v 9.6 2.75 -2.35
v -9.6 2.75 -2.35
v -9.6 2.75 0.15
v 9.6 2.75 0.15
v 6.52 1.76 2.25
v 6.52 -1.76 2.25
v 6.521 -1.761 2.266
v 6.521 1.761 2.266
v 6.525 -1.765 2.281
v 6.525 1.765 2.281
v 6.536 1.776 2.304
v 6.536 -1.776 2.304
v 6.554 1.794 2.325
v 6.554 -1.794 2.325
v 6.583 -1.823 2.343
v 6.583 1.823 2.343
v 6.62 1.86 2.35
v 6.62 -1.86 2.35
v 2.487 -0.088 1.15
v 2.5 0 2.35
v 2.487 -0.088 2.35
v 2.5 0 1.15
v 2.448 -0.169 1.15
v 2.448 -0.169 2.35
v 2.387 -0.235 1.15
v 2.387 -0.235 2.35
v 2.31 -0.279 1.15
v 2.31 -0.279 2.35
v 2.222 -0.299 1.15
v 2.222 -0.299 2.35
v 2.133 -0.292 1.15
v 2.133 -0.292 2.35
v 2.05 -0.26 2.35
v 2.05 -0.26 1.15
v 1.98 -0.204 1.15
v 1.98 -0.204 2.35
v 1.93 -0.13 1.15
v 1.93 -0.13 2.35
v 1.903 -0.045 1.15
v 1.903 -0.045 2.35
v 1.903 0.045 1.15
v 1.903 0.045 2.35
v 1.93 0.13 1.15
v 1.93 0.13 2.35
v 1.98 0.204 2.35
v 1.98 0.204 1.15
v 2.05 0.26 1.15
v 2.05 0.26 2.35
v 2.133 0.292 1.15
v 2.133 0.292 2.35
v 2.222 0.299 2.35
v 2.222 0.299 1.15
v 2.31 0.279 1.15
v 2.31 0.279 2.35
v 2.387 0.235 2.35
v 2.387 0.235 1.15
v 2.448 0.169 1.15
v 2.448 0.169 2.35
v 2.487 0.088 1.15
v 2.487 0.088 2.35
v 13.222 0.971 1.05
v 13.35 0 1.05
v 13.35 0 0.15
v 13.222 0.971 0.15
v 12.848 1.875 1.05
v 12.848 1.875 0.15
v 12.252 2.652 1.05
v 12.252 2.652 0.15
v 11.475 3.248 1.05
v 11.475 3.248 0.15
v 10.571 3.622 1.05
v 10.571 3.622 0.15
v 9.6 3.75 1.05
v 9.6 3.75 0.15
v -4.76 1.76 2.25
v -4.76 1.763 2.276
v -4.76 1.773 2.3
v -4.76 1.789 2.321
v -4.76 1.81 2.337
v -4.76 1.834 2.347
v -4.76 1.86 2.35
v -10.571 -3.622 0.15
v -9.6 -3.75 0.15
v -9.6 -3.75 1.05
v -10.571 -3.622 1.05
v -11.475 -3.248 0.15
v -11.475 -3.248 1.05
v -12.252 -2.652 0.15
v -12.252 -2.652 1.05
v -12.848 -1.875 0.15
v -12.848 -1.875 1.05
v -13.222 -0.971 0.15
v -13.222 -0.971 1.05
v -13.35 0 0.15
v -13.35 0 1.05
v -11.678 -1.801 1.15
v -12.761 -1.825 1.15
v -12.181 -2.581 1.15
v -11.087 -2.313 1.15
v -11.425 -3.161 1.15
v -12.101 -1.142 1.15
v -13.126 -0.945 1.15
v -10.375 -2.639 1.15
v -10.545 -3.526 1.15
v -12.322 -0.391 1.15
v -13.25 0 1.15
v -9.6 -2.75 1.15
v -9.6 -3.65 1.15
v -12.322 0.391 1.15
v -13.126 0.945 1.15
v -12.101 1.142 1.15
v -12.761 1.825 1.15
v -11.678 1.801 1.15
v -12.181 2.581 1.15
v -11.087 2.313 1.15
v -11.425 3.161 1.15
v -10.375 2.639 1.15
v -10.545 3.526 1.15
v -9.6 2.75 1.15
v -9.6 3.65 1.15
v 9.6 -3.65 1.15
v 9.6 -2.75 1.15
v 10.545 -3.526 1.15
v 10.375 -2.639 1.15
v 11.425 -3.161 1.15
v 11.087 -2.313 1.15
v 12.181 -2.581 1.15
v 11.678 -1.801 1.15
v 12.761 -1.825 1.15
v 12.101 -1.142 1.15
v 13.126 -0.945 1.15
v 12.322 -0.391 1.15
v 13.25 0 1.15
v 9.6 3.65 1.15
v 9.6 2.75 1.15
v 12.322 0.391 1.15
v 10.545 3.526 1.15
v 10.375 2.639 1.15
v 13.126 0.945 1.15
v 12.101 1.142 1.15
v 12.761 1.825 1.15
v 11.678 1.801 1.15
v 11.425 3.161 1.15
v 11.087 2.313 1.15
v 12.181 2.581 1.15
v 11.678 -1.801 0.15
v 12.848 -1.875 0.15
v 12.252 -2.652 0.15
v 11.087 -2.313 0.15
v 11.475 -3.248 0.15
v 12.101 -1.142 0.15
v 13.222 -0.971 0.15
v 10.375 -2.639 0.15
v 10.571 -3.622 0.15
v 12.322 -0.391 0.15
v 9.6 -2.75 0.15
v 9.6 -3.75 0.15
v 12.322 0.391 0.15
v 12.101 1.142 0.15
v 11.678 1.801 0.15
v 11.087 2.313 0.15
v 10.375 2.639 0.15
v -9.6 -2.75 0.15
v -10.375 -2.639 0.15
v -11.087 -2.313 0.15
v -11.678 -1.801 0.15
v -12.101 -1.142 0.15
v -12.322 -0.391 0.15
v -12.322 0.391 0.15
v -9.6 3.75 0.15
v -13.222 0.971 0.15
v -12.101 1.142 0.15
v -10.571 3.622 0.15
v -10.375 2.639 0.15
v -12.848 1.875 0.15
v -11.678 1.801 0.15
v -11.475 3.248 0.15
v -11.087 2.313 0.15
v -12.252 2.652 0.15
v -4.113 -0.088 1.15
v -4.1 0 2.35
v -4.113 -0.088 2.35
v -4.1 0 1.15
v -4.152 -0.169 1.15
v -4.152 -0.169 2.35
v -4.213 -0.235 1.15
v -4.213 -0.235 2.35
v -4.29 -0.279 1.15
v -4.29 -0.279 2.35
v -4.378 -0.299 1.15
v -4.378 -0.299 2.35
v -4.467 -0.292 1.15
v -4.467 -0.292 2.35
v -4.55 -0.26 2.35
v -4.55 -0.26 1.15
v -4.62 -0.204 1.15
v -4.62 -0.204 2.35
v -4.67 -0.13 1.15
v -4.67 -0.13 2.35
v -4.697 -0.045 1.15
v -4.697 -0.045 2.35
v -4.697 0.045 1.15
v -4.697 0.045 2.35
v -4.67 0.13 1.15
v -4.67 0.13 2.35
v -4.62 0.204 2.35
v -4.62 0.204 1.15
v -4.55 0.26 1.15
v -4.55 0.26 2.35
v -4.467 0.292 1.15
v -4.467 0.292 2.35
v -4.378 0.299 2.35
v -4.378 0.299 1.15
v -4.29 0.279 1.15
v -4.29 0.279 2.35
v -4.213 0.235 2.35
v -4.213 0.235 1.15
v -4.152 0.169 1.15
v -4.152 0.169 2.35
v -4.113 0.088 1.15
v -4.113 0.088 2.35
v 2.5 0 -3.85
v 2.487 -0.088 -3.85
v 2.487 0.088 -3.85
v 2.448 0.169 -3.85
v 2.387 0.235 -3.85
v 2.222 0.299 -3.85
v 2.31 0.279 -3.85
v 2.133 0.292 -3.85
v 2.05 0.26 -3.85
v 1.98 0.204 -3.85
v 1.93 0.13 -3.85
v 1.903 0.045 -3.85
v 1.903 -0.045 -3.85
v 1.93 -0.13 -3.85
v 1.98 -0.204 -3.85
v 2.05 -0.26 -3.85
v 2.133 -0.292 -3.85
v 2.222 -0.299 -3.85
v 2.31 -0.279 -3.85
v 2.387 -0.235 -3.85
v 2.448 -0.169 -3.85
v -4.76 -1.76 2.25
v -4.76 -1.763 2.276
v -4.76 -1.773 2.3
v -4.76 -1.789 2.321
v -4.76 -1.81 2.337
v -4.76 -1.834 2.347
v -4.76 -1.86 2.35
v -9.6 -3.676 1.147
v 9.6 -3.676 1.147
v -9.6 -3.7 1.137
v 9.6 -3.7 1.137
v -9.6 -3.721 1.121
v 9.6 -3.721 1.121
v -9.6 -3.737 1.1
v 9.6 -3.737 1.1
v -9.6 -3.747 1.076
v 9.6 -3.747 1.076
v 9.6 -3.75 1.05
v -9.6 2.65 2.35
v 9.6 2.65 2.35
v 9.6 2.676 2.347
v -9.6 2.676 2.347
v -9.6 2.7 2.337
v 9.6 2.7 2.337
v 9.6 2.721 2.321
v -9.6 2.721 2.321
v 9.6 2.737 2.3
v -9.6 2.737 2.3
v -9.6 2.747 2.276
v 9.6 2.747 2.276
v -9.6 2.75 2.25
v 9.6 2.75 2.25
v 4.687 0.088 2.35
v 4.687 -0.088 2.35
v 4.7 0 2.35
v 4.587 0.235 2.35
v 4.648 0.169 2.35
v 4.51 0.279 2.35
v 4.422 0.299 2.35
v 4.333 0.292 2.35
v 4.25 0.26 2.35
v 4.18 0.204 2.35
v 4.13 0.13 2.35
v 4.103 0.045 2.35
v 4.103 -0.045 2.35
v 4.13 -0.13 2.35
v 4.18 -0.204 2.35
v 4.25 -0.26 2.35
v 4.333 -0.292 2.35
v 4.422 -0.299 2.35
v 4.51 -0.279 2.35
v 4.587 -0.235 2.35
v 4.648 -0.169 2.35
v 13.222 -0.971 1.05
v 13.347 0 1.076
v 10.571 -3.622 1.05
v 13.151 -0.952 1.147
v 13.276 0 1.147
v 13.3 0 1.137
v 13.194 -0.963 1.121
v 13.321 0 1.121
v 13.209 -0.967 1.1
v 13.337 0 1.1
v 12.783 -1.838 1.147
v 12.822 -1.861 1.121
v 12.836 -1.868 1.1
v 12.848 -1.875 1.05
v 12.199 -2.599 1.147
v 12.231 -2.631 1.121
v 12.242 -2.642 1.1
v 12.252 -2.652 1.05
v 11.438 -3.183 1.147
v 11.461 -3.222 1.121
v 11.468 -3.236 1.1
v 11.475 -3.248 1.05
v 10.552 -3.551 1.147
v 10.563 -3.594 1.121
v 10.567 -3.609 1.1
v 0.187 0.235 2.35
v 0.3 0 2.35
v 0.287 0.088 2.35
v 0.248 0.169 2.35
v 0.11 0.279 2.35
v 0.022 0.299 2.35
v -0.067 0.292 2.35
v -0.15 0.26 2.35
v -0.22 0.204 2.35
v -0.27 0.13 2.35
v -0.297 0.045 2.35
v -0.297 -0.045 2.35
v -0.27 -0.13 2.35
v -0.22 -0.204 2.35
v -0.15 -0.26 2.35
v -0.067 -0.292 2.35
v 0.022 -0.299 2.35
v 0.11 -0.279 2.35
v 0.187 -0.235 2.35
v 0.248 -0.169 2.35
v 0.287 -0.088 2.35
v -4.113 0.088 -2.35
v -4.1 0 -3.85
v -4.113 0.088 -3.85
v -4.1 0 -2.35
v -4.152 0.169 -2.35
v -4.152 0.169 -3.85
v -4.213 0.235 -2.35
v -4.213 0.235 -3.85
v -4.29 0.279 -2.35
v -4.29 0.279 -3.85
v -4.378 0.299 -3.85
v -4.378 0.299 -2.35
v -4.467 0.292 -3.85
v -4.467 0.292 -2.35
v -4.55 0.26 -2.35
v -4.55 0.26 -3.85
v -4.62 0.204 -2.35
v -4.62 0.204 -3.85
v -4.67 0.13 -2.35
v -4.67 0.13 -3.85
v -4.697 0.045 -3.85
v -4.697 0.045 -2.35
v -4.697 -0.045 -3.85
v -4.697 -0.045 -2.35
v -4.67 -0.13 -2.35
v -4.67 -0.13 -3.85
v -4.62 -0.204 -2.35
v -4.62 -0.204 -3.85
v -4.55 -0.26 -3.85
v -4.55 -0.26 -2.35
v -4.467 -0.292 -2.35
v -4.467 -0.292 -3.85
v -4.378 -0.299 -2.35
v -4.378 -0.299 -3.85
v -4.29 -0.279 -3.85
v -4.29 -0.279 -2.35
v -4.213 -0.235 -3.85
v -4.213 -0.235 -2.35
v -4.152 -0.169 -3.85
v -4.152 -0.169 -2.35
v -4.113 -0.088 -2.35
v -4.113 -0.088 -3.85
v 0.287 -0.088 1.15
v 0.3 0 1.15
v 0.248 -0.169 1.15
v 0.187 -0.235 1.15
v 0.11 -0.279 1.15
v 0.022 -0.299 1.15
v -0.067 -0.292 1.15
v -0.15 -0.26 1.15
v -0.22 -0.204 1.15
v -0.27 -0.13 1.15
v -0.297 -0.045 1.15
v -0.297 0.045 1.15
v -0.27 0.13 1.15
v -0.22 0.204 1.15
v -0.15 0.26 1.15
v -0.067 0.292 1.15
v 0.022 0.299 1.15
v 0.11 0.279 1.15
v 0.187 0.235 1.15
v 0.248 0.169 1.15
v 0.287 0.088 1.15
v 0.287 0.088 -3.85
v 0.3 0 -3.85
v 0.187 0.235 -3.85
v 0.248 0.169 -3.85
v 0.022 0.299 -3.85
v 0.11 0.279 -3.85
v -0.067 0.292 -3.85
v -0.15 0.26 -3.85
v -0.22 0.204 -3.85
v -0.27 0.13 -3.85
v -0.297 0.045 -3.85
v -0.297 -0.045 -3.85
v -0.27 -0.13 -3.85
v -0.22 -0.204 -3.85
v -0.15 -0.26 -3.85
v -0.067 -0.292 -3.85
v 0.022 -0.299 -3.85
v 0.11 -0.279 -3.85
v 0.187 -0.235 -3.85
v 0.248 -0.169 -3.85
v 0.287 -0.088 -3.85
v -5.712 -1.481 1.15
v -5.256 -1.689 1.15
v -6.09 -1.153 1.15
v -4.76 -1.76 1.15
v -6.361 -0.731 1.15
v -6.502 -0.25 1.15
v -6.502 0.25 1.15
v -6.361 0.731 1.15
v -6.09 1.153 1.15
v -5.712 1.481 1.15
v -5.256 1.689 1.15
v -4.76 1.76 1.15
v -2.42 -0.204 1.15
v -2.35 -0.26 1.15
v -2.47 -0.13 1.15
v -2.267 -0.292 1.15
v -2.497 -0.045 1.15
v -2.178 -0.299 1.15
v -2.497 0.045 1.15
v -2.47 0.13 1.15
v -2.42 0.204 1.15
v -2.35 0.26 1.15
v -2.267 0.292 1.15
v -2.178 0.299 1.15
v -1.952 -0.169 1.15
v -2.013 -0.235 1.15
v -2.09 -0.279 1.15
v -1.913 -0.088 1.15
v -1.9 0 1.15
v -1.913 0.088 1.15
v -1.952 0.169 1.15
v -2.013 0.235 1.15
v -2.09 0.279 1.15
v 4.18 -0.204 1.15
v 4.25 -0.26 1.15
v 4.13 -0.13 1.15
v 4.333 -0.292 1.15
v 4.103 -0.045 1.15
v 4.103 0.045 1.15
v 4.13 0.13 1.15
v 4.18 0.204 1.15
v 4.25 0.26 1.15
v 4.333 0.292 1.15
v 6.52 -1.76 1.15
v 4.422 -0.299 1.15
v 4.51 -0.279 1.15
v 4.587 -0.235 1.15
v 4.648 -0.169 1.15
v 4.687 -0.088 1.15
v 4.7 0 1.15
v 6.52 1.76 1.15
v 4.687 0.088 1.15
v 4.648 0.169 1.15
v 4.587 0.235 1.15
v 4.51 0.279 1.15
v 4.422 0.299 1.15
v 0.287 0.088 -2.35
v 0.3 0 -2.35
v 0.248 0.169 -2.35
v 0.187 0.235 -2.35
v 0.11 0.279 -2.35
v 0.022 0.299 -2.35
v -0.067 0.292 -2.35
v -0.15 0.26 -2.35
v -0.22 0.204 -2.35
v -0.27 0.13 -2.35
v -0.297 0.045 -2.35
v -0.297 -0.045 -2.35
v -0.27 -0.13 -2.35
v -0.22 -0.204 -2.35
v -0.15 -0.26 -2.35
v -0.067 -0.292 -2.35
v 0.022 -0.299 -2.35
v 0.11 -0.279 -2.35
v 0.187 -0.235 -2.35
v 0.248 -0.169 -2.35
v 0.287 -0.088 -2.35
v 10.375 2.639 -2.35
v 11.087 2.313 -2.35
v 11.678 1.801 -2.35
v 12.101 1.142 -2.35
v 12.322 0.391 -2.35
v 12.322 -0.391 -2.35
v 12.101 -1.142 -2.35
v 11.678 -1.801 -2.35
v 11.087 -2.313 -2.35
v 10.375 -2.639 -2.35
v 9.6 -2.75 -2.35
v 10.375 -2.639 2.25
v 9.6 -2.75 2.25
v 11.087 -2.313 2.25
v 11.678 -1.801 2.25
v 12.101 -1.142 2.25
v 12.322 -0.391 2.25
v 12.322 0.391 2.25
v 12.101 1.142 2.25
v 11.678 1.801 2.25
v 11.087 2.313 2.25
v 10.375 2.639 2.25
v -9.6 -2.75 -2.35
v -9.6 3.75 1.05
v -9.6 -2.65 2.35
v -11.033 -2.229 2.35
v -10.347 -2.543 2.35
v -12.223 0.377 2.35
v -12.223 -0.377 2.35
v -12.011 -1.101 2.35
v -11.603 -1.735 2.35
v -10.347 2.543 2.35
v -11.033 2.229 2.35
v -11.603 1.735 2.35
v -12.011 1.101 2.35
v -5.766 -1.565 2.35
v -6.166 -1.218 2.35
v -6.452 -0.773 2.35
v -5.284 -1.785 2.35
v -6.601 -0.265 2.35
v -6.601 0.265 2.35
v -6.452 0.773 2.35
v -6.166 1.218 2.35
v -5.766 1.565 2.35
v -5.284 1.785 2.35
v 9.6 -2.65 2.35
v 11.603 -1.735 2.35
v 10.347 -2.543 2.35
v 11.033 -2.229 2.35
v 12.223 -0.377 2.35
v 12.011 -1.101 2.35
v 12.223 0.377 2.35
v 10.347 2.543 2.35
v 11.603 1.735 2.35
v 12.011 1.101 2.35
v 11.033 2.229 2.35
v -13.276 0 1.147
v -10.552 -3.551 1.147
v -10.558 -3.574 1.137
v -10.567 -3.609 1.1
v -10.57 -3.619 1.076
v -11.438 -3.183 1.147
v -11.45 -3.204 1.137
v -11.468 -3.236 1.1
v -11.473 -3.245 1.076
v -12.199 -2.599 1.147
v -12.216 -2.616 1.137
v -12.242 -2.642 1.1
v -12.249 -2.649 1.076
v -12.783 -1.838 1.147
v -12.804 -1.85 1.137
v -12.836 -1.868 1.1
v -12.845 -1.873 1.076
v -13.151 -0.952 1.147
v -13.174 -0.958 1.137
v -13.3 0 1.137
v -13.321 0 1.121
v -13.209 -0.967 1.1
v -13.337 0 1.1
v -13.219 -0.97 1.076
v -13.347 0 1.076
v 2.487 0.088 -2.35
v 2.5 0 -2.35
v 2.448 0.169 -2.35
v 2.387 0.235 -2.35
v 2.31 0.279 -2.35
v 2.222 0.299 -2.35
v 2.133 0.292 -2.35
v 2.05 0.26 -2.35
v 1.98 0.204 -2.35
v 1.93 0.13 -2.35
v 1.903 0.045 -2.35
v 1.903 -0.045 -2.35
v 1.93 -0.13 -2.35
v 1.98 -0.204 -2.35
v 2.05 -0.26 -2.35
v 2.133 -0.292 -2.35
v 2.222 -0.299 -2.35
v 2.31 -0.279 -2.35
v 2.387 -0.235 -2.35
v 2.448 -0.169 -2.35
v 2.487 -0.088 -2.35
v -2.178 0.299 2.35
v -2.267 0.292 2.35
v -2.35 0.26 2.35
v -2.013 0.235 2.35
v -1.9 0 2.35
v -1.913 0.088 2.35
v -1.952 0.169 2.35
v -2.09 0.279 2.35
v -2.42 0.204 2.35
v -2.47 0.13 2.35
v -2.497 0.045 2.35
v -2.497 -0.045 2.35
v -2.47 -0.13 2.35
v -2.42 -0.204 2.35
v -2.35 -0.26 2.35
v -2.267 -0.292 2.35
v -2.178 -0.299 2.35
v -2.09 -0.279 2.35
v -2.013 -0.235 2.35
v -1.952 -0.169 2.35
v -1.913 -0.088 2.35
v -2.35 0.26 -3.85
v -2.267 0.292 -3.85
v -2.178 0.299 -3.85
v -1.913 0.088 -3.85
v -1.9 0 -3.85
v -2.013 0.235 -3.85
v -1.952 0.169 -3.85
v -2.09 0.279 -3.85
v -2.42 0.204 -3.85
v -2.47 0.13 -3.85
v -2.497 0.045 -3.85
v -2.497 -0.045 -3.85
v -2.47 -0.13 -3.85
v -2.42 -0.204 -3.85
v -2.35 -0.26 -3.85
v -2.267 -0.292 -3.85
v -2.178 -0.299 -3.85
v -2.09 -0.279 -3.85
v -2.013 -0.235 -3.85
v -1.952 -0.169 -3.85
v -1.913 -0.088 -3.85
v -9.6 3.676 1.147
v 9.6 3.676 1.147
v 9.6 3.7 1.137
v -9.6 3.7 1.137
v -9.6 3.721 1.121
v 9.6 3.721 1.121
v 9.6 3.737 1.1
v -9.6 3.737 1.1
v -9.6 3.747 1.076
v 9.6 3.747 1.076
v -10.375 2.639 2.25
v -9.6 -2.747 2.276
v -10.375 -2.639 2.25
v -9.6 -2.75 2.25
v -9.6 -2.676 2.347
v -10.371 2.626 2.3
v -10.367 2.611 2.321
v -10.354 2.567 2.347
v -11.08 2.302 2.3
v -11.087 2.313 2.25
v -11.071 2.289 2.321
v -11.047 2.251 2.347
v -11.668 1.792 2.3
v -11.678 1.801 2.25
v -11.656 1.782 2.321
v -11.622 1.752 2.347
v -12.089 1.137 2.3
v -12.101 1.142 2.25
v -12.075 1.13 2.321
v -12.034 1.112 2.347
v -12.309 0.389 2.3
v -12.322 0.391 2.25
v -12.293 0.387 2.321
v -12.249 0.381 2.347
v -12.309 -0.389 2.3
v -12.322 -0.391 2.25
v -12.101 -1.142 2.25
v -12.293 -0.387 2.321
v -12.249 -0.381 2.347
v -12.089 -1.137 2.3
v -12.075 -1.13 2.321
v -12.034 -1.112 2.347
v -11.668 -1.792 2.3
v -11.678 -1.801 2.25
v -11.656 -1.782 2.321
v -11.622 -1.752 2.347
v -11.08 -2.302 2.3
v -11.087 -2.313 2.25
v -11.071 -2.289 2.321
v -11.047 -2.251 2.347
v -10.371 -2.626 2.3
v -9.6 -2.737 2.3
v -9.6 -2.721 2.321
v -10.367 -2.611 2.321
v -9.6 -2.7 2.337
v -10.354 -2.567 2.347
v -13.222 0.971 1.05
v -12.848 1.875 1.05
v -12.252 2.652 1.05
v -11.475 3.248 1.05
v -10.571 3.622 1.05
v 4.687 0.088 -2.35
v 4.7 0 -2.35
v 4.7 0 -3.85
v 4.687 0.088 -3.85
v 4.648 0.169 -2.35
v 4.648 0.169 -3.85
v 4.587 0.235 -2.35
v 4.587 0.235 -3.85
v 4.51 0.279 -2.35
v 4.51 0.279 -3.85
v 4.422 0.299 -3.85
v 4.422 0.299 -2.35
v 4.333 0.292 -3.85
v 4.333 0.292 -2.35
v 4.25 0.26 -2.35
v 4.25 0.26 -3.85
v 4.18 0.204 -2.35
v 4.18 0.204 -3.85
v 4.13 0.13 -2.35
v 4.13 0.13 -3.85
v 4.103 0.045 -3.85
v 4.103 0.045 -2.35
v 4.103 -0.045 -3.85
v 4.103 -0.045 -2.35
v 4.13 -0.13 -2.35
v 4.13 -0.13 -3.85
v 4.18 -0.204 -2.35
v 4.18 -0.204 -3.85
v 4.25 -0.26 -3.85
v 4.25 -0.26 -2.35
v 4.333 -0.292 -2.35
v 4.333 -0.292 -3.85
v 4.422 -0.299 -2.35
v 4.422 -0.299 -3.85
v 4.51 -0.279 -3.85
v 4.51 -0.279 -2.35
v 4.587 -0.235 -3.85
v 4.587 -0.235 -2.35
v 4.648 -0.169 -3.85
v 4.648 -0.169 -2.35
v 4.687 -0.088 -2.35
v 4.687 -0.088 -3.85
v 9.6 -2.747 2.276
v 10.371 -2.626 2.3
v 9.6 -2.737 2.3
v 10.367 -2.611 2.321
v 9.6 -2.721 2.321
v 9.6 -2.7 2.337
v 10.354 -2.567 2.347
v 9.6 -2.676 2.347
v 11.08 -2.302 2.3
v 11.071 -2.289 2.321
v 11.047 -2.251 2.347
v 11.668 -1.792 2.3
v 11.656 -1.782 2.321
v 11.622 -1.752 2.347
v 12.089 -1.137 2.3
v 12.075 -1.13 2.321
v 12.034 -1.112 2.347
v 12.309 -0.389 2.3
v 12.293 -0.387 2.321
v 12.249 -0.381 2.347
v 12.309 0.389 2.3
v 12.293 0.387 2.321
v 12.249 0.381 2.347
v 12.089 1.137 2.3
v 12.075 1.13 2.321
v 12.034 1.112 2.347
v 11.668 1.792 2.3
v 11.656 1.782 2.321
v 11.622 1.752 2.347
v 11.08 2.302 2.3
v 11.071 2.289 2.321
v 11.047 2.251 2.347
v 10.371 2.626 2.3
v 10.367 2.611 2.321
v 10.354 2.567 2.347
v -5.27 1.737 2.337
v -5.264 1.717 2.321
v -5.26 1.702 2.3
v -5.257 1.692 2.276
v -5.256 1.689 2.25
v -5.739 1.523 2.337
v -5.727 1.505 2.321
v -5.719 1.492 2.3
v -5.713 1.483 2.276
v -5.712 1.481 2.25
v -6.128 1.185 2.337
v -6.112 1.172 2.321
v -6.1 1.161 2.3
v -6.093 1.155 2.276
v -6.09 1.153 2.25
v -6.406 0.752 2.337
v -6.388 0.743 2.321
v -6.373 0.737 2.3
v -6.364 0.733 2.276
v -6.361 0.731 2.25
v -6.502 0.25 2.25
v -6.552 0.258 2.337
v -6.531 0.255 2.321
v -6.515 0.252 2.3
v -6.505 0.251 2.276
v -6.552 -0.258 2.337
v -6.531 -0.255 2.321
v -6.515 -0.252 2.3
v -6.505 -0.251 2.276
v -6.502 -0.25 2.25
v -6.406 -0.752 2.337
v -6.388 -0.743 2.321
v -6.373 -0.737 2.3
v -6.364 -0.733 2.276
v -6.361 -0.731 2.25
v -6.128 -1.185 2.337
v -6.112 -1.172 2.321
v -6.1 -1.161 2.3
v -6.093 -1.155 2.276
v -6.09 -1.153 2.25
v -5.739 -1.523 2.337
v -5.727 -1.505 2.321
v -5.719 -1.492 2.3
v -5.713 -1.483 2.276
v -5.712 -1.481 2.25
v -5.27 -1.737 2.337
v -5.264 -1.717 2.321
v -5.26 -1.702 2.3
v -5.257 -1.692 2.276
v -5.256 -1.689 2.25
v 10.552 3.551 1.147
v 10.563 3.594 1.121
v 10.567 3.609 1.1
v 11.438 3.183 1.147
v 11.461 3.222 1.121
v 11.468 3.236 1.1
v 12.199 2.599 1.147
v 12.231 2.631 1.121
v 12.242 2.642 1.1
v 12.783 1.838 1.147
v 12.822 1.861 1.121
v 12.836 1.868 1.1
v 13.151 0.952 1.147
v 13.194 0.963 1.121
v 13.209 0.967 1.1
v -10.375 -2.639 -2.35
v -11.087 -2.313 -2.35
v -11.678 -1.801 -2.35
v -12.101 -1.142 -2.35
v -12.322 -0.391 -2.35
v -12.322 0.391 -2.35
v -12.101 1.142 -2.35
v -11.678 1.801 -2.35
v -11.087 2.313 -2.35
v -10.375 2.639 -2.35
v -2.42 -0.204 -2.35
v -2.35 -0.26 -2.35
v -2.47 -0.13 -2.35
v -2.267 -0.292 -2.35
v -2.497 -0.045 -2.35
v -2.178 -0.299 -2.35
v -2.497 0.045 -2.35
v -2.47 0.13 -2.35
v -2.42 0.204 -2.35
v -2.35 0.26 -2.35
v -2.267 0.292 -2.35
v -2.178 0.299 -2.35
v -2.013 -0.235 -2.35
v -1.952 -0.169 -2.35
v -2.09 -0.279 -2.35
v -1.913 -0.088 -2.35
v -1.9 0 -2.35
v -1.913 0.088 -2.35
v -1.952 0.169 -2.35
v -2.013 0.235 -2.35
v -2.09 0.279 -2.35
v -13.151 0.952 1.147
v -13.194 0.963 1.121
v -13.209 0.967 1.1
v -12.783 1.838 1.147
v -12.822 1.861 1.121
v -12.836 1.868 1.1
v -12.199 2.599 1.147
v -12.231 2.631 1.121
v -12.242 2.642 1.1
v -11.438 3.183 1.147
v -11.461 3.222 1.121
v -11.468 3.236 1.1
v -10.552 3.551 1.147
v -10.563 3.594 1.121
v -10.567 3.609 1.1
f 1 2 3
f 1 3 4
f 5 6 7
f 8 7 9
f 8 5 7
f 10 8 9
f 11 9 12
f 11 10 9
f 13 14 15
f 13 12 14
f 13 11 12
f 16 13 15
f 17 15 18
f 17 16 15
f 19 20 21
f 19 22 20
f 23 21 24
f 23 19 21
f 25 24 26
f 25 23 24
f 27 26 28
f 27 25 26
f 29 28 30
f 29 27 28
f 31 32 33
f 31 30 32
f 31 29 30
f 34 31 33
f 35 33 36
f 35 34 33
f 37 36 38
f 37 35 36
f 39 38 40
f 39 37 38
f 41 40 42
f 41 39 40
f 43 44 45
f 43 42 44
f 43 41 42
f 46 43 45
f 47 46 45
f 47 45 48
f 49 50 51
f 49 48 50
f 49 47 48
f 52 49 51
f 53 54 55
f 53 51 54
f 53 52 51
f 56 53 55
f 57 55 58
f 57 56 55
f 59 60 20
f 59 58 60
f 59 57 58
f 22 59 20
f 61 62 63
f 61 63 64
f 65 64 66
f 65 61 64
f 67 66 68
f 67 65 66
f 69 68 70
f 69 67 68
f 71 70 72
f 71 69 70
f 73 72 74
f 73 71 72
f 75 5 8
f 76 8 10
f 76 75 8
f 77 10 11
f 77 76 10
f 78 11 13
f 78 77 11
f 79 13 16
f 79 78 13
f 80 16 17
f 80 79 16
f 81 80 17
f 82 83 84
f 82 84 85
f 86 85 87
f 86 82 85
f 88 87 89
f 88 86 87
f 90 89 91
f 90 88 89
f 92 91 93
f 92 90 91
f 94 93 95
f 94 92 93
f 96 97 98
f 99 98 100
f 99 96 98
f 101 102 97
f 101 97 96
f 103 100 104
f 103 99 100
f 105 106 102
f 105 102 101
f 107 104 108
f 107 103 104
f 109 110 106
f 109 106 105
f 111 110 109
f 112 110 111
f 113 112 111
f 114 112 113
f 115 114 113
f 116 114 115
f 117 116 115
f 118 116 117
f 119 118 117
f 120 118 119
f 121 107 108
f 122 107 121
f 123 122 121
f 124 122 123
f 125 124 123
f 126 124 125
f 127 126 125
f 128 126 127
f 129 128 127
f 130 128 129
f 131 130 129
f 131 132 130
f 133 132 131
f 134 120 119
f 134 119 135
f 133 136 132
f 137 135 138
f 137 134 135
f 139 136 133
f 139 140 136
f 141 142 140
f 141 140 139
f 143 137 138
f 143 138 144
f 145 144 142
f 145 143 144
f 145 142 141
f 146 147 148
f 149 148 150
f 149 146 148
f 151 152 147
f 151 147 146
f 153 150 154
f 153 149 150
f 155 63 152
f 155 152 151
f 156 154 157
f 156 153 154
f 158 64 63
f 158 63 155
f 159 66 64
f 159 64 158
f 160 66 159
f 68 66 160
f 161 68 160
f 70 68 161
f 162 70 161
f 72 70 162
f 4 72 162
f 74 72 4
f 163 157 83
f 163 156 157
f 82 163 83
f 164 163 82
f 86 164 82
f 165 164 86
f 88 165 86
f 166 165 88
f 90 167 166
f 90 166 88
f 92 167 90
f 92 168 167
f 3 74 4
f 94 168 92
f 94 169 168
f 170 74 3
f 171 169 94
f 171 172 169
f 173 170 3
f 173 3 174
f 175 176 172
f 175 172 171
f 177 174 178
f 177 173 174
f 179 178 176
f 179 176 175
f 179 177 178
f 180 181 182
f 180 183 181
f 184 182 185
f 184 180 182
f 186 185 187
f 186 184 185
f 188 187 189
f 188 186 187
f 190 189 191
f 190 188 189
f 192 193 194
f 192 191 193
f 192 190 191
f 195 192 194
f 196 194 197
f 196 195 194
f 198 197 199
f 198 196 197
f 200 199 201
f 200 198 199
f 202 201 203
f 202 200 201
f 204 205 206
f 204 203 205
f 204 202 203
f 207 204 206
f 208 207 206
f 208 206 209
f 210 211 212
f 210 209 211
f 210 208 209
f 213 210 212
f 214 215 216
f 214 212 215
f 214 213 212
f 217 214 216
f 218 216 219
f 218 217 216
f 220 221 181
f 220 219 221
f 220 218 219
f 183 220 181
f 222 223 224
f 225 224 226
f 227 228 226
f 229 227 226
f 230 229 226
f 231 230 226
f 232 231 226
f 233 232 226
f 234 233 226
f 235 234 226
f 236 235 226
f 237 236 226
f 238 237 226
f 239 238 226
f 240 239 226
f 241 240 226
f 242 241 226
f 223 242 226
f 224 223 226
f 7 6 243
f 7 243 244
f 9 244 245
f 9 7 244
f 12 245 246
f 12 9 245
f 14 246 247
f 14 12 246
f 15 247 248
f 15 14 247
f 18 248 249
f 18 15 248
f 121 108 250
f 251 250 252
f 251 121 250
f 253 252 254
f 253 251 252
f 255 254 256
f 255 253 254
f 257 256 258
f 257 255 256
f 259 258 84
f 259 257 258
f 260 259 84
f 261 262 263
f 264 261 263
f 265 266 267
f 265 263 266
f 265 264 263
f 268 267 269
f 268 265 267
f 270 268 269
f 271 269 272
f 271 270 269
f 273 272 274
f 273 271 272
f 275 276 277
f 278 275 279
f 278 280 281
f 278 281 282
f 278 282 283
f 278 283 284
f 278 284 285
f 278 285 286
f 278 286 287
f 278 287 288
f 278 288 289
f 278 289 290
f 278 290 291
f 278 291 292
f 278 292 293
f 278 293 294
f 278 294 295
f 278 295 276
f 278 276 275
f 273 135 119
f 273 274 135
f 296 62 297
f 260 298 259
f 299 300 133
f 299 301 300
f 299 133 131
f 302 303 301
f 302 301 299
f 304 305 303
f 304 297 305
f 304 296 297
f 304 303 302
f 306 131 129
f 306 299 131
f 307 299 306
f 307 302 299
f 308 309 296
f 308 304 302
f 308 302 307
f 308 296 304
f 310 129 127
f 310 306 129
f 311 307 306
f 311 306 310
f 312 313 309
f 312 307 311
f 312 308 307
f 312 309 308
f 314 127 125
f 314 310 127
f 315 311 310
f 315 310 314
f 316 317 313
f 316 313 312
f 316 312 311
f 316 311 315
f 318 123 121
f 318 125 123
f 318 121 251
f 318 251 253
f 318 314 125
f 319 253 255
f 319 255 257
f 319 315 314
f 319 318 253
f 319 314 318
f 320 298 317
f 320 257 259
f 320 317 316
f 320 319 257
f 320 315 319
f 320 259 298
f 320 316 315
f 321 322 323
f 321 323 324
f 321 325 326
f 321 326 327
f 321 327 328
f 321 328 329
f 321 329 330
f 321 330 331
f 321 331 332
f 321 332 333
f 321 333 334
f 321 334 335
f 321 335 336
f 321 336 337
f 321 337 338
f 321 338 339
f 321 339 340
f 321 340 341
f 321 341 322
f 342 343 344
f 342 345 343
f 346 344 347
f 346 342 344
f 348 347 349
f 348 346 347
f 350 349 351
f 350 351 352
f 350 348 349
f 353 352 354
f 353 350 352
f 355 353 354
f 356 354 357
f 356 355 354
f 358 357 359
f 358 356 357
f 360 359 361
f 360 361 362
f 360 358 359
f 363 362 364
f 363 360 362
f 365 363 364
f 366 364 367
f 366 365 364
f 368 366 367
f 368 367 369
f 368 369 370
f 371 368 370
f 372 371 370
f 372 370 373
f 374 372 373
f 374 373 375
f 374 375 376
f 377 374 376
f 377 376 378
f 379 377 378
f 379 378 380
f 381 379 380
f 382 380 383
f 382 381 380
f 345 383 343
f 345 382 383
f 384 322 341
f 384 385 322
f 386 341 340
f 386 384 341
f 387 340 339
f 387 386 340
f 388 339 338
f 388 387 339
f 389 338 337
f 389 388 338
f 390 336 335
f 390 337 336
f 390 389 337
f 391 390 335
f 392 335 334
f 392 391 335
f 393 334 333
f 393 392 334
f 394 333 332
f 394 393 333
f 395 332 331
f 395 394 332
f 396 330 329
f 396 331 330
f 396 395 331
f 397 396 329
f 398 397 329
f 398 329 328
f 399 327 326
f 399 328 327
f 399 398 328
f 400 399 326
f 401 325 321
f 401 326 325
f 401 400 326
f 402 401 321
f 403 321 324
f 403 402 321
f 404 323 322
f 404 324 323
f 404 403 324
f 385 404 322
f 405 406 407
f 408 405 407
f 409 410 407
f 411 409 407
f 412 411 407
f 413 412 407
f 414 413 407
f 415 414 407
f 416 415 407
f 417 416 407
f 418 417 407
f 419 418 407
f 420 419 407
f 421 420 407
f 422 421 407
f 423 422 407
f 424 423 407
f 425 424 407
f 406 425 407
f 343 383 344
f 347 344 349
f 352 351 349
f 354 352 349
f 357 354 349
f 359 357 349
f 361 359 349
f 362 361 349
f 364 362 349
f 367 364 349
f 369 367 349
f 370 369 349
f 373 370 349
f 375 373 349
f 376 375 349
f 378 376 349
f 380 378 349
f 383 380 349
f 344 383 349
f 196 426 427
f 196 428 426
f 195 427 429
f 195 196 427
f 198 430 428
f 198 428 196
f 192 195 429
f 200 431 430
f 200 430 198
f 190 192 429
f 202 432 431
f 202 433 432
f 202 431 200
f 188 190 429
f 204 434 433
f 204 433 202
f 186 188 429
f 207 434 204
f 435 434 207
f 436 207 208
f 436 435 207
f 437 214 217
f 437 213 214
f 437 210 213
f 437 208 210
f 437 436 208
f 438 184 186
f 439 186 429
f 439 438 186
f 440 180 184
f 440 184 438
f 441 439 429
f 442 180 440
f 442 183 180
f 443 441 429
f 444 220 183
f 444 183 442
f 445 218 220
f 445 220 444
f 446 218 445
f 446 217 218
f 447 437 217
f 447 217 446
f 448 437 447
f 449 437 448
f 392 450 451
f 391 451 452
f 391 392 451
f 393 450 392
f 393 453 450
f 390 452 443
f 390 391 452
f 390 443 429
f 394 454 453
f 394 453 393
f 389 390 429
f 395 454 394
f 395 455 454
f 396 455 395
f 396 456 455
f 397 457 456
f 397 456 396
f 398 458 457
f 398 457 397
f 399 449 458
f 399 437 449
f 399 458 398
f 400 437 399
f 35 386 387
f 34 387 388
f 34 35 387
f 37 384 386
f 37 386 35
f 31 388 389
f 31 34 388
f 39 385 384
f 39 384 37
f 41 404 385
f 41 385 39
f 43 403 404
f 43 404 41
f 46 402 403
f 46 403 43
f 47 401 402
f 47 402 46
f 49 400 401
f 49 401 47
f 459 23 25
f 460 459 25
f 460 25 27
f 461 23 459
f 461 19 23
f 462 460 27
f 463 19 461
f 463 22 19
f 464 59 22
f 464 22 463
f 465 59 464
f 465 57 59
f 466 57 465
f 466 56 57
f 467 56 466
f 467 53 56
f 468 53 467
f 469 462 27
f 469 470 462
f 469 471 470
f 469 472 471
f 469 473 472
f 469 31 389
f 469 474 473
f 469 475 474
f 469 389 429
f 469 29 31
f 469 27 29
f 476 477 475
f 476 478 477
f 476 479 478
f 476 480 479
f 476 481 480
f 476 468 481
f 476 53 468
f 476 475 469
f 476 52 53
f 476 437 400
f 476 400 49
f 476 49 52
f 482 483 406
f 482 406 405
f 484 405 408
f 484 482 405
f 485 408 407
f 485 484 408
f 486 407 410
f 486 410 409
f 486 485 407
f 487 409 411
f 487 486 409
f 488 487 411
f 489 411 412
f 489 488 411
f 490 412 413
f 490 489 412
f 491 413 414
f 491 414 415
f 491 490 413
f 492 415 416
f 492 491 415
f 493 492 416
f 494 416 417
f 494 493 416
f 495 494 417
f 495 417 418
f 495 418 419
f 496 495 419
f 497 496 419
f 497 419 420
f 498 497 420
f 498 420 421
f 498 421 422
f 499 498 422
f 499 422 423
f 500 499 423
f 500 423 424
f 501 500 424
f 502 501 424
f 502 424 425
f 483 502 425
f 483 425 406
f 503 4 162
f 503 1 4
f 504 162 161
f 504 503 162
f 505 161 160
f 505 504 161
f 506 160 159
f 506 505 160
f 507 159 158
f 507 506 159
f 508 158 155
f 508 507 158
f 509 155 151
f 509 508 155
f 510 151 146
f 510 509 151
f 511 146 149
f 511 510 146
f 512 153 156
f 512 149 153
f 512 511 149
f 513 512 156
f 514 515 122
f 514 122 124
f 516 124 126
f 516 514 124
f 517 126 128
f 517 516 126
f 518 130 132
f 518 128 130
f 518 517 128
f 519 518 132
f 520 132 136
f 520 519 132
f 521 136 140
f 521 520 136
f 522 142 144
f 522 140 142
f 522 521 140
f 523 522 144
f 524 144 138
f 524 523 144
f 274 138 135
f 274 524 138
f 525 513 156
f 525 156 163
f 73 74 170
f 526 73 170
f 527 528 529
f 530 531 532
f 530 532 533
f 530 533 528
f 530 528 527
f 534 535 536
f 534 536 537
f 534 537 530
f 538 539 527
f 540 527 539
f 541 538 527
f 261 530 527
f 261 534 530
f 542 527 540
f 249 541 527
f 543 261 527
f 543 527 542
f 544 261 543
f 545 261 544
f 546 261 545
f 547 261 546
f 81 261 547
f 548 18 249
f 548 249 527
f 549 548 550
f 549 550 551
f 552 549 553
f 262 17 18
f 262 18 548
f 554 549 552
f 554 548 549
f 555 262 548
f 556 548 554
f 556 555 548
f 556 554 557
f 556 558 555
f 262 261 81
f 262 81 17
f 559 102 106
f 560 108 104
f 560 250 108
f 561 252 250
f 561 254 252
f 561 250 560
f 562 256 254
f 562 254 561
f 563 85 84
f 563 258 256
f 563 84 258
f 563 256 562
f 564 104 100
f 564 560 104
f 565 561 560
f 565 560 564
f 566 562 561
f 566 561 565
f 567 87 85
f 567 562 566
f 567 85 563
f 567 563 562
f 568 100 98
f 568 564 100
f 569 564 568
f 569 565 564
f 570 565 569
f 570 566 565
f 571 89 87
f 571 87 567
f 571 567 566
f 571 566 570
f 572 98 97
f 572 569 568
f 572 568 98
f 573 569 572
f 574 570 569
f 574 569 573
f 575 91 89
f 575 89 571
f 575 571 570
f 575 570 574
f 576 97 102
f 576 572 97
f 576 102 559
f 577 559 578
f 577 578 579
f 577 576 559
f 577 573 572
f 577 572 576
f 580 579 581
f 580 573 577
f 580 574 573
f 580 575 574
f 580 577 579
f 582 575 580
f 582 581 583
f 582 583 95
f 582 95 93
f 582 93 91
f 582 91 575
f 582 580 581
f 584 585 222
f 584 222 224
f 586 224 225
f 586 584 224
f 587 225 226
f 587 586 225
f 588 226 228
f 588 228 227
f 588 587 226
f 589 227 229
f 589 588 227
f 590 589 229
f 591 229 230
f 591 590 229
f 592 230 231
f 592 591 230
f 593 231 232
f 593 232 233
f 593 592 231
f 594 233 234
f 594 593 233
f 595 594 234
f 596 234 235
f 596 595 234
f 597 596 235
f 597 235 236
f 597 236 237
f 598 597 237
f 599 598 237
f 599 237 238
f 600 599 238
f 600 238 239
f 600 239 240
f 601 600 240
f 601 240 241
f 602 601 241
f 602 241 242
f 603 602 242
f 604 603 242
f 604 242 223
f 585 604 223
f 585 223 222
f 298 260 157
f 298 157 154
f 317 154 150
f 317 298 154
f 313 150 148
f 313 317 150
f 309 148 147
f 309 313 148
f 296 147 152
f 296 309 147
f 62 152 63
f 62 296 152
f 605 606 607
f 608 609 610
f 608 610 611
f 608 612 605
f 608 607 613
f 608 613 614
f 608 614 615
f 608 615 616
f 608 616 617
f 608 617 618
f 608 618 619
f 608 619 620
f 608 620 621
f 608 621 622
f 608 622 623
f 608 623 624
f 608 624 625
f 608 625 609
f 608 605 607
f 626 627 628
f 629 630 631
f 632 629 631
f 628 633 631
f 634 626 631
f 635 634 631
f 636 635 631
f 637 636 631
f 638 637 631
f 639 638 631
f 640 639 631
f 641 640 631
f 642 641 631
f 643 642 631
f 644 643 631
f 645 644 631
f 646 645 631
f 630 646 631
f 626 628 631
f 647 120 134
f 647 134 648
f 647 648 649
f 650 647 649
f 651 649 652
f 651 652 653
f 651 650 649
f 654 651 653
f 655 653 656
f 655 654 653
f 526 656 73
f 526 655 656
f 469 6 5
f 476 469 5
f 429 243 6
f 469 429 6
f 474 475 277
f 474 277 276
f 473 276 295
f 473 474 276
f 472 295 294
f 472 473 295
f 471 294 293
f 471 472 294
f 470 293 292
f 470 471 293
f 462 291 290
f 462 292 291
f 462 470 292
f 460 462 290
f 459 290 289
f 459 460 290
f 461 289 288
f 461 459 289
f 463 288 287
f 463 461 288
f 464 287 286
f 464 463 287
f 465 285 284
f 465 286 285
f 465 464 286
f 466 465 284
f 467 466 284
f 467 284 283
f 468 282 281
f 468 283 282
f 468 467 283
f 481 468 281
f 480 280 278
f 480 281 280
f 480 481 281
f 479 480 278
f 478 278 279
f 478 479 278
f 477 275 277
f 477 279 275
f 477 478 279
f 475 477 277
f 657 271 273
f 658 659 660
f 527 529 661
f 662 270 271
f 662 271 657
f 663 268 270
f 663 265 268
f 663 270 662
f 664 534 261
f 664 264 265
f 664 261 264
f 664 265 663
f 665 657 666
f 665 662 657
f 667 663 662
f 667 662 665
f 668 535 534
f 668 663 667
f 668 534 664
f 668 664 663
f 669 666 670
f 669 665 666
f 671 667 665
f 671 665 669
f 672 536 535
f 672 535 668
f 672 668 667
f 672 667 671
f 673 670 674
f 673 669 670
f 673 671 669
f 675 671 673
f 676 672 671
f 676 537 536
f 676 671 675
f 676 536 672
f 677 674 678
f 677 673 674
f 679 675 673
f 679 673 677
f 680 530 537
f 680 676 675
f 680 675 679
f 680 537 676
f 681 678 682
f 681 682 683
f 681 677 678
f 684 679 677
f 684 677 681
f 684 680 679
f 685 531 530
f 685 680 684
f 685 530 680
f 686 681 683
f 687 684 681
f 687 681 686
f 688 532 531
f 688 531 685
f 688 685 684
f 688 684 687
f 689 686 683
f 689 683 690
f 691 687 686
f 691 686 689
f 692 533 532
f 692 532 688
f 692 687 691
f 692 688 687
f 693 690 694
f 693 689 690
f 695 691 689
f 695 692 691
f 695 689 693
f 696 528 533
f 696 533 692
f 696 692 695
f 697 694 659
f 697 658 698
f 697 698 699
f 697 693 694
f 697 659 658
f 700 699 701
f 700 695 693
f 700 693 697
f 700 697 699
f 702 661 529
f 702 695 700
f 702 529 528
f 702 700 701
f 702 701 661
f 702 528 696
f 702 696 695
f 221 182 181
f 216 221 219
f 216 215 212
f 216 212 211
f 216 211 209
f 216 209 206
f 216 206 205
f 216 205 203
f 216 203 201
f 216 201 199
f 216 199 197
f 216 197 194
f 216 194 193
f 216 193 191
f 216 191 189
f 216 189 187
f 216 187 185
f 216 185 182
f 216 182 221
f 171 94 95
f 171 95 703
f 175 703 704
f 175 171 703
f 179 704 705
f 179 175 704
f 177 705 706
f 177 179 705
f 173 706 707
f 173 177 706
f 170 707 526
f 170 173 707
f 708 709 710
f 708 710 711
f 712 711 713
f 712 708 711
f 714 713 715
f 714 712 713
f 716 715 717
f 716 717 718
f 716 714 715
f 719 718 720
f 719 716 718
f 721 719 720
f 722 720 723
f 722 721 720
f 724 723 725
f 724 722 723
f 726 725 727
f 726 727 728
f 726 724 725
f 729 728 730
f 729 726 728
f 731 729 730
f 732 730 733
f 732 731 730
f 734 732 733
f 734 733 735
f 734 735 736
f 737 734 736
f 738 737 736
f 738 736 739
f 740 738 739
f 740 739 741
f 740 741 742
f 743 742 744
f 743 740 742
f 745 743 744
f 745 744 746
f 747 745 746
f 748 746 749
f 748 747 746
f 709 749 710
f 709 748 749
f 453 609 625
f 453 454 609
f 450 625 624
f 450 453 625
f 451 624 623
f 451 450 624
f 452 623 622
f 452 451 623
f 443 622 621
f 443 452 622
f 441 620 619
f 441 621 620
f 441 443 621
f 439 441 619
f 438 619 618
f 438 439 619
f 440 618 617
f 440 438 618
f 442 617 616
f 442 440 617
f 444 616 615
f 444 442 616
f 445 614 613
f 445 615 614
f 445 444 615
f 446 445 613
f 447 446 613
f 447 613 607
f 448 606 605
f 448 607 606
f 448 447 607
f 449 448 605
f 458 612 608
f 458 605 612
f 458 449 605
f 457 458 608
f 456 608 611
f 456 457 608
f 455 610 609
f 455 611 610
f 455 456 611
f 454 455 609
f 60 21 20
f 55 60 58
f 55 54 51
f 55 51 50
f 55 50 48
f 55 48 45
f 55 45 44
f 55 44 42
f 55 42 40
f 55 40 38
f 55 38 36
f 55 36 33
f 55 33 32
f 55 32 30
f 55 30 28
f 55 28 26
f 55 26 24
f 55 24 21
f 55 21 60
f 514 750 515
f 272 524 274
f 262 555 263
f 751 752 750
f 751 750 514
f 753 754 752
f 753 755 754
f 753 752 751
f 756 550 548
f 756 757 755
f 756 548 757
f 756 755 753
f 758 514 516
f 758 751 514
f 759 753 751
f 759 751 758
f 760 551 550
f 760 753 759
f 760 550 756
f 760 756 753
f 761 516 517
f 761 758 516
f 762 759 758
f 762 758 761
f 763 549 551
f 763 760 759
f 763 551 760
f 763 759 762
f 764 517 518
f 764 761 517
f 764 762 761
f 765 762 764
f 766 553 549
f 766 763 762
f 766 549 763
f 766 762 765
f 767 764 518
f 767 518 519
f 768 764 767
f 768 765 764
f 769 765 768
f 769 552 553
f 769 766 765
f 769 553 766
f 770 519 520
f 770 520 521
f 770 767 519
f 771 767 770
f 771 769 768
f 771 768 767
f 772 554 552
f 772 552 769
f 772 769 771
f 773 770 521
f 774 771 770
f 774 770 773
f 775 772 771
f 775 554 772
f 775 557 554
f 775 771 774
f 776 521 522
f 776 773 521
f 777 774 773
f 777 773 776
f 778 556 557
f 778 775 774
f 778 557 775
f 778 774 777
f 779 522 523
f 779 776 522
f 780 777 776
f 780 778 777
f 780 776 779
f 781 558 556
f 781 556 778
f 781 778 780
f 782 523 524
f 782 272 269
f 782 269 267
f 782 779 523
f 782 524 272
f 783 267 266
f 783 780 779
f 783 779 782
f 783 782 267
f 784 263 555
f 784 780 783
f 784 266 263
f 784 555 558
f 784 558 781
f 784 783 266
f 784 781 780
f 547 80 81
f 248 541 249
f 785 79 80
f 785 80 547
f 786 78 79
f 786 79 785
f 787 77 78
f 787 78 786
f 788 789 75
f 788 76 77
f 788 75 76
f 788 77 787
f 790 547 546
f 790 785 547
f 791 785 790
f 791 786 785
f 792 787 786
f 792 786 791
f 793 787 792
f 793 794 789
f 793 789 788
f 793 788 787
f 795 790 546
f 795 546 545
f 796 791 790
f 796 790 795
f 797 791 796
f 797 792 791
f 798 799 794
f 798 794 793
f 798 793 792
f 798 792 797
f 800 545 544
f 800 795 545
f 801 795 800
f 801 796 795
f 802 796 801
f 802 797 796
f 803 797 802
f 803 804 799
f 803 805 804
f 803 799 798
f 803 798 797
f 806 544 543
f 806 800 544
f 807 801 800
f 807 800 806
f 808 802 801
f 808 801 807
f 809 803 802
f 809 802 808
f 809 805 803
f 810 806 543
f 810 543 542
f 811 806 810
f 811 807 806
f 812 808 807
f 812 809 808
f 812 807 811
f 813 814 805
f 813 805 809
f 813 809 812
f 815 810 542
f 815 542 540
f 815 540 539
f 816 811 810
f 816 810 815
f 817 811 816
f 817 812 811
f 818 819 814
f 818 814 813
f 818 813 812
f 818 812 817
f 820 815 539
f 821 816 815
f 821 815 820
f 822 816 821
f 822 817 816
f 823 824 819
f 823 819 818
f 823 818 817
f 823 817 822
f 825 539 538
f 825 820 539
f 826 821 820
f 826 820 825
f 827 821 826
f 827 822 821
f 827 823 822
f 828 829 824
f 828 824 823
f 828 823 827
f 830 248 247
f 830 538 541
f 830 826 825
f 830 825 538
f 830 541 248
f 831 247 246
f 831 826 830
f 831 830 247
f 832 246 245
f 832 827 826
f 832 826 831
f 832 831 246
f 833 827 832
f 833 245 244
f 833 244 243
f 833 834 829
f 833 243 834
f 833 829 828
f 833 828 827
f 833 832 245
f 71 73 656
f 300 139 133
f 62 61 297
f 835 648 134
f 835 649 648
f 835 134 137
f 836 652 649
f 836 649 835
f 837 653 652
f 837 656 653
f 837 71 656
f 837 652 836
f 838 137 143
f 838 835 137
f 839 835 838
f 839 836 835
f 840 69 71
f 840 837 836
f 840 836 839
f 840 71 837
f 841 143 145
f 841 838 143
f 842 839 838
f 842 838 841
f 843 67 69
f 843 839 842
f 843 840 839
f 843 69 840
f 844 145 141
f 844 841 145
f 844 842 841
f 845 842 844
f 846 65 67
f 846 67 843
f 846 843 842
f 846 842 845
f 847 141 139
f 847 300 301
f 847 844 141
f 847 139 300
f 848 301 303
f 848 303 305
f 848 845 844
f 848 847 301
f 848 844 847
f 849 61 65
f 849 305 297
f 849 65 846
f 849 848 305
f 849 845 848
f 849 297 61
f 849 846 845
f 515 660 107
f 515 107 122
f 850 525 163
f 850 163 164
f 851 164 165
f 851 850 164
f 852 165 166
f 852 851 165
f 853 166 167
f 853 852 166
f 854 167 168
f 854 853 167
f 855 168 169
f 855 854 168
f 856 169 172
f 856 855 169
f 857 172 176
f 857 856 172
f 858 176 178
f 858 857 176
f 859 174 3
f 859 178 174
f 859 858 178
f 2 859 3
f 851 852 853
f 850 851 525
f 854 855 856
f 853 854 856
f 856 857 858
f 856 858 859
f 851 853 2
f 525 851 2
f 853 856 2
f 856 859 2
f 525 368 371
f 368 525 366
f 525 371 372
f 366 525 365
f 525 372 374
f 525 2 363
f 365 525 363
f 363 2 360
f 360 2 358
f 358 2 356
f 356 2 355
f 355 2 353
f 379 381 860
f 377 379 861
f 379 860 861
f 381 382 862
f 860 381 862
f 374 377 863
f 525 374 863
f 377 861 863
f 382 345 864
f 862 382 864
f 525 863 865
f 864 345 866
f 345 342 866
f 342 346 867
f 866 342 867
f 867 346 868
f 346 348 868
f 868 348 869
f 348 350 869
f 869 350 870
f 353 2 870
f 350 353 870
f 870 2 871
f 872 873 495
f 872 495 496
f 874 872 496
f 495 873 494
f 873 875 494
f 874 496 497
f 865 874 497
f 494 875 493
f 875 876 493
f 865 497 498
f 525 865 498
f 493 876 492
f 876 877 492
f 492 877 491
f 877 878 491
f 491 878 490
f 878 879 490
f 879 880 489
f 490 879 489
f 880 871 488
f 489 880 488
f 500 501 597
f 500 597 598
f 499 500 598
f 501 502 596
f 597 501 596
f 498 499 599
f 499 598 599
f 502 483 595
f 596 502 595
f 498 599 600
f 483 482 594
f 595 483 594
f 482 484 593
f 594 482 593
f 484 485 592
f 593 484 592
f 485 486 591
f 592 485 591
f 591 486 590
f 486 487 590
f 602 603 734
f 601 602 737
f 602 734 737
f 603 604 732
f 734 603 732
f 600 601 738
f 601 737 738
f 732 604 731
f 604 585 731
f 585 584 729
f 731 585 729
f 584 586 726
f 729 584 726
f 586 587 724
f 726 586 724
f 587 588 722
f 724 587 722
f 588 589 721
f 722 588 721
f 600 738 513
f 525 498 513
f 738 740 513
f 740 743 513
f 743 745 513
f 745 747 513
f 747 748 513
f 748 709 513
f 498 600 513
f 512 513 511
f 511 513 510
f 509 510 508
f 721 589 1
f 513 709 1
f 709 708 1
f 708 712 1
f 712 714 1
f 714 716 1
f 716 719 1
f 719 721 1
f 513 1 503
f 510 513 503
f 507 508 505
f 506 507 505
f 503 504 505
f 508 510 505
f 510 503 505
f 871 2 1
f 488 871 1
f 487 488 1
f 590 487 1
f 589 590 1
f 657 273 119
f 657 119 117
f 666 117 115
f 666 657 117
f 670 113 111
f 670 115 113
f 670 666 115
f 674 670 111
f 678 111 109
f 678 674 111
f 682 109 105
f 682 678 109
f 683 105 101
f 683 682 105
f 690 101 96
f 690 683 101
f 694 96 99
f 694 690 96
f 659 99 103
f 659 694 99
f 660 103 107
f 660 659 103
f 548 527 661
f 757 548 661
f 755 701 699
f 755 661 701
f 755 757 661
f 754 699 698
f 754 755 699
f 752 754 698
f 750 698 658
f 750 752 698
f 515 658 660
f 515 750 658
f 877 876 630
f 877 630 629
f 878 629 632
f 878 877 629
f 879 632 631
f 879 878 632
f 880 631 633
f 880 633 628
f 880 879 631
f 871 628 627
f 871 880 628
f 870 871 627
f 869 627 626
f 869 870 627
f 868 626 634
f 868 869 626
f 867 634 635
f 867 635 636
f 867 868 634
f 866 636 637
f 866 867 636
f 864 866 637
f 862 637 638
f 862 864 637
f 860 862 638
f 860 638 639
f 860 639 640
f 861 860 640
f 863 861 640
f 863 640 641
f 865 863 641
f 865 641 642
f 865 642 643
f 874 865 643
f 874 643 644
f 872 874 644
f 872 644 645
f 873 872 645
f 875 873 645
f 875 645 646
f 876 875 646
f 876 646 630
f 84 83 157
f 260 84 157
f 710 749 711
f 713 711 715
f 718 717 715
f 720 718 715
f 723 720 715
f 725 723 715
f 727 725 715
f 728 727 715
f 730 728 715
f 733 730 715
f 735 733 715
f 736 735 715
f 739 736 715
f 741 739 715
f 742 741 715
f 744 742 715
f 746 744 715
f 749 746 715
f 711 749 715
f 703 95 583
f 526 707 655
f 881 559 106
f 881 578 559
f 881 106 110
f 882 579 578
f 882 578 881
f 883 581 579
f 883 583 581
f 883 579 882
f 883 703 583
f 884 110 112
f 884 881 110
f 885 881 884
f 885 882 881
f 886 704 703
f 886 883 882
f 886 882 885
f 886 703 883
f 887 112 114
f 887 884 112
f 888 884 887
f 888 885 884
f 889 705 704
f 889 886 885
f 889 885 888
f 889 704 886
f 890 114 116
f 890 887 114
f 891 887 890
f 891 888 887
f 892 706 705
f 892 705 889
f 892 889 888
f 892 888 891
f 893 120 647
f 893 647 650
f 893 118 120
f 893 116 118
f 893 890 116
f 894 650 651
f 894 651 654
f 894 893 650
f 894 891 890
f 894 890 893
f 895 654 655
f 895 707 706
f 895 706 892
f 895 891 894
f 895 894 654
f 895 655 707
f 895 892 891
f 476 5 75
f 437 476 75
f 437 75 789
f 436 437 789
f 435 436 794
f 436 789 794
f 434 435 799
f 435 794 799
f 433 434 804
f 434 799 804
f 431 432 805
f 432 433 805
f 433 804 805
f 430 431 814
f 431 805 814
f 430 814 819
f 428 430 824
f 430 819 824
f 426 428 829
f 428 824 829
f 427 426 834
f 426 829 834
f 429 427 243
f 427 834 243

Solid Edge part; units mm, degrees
sketch "Sketch1" plane through (0, 0, 0) normal (0, 0, 1) x (1, 0, 0)
  line L0 (-13.35, -3.75) -> (13.35, -3.75)
  line L1 (13.35, -3.75) -> (13.35, 3.75)
  line L2 (13.35, 3.75) -> (-13.35, 3.75)
  line L3 (-13.35, 3.75) -> (-13.35, -3.75)
  dimension "D1" = 26.7
  dimension "D2" = 7.5
extrude "Protrusion1" add sketch "Sketch1" along normal mid plane 4.7
fillet "Verrundung_1" radius 3.75 4 edges at (13.35, -3.75, 0) (13.35, 3.75, 0) (-13.35, -3.75, 0) (-13.35, 3.75, 0)
sketch "Sketch2" plane through (0, 0, 2.35) normal (0, 0, 1) x (1, 0, 0)
  line L0 (-9.6, -2.75) -> (9.6, -2.75)
  arc A0 (9.6, -2.75) -> (12.35, 0) centre (9.6, 0) ccw
  arc A1 (12.35, 0) -> (9.6, 2.75) centre (9.6, 0) ccw
  line L1 (9.6, 2.75) -> (-9.6, 2.75)
  arc A2 (-9.6, 2.75) -> (-12.35, 0) centre (-9.6, 0) ccw
  arc A3 (-9.6, -2.75) -> (-12.35, 0) centre (-9.6, 0) cw
  dimension "D1" = 19.2
extrude "Extrusionsausschnitt_1" cut sketch "Sketch2" against normal blind 1.2 flip side to cut
sketch "Sketch3" plane through (0, 0, -2.35) normal (0, 0, -1) x (1, 0, 0)
  line L0 (-9.6, -2.75) -> (9.6, -2.75)
  arc A0 (9.6, -2.75) -> (12.35, 0) centre (9.6, 0) ccw
  arc A1 (12.35, 0) -> (9.6, 2.75) centre (9.6, 0) ccw
  line L1 (9.6, 2.75) -> (-9.6, 2.75)
  arc A2 (-9.6, 2.75) -> (-12.35, 0) centre (-9.6, 0) ccw
  arc A3 (-9.6, -2.75) -> (-12.35, 0) centre (-9.6, 0) cw
  dimension "D1" = 19.2
extrude "Extrusionsausschnitt_2" cut sketch "Sketch3" against normal blind 2.5 flip side to cut
sketch "Sketch4" plane through (0, 0, 2.35) normal (0, 0, 1) x (1, 0, 0)
  line L0 (-4.76, -1.76) -> (6.52, -1.76)
  line L1 (6.52, -1.76) -> (6.52, 1.76)
  line L2 (6.52, 1.76) -> (-4.76, 1.76)
  arc A0 (-4.76, 1.76) -> (-6.52, 0) centre (-4.76, 0) ccw
  arc A1 (-4.76, -1.76) -> (-6.52, 0) centre (-4.76, 0) cw
  dimension "D1" = 11.28
  dimension "D2" = 3.52
extrude "Extrusionsausschnitt_3" cut sketch "Sketch4" against normal blind 1.2
sketch "Sketch5" plane through (0, 0, 1.15) normal (0, 0, 1) x (1, 0, 0)
  circle A0 centre (4.4, 0) radius 0.3
  circle A1 centre (2.2, 0) radius 0.3
  circle A2 centre (0, 0) radius 0.3
  circle A3 centre (-2.2, 0) radius 0.3
  circle A4 centre (-4.4, 0) radius 0.3
  dimension "D1" = 0.6
  dimension "D2" = 0.6
  dimension "D3" = 0.6
  dimension "D4" = 0.6
  dimension "D5" = 0.6
  dimension "D6" = 2.2
  dimension "D7" = 2.2
  dimension "D8" = 2.2
  dimension "D9" = 2.2
  dimension "D10" = 2.12
extrude "Extrusionsausprägung_2" add sketch "Sketch5" along normal blind 1.2 and the other way blind 5
fillet "Verrundung_2" radius 0.1 11 edges at (0.88, 1.76, 2.35) (-6.52, 0, 2.35) (0.88, -1.76, 2.35) (6.52, 0, 2.35) (0, 2.75, 2.35) (-12.35, 0, 2.35) (0, -2.75, 2.35) (12.35, 0, 2.35) (0, 3.75, 1.15) (-13.35, 0, 1.15) (0, -3.75, 1.15)
